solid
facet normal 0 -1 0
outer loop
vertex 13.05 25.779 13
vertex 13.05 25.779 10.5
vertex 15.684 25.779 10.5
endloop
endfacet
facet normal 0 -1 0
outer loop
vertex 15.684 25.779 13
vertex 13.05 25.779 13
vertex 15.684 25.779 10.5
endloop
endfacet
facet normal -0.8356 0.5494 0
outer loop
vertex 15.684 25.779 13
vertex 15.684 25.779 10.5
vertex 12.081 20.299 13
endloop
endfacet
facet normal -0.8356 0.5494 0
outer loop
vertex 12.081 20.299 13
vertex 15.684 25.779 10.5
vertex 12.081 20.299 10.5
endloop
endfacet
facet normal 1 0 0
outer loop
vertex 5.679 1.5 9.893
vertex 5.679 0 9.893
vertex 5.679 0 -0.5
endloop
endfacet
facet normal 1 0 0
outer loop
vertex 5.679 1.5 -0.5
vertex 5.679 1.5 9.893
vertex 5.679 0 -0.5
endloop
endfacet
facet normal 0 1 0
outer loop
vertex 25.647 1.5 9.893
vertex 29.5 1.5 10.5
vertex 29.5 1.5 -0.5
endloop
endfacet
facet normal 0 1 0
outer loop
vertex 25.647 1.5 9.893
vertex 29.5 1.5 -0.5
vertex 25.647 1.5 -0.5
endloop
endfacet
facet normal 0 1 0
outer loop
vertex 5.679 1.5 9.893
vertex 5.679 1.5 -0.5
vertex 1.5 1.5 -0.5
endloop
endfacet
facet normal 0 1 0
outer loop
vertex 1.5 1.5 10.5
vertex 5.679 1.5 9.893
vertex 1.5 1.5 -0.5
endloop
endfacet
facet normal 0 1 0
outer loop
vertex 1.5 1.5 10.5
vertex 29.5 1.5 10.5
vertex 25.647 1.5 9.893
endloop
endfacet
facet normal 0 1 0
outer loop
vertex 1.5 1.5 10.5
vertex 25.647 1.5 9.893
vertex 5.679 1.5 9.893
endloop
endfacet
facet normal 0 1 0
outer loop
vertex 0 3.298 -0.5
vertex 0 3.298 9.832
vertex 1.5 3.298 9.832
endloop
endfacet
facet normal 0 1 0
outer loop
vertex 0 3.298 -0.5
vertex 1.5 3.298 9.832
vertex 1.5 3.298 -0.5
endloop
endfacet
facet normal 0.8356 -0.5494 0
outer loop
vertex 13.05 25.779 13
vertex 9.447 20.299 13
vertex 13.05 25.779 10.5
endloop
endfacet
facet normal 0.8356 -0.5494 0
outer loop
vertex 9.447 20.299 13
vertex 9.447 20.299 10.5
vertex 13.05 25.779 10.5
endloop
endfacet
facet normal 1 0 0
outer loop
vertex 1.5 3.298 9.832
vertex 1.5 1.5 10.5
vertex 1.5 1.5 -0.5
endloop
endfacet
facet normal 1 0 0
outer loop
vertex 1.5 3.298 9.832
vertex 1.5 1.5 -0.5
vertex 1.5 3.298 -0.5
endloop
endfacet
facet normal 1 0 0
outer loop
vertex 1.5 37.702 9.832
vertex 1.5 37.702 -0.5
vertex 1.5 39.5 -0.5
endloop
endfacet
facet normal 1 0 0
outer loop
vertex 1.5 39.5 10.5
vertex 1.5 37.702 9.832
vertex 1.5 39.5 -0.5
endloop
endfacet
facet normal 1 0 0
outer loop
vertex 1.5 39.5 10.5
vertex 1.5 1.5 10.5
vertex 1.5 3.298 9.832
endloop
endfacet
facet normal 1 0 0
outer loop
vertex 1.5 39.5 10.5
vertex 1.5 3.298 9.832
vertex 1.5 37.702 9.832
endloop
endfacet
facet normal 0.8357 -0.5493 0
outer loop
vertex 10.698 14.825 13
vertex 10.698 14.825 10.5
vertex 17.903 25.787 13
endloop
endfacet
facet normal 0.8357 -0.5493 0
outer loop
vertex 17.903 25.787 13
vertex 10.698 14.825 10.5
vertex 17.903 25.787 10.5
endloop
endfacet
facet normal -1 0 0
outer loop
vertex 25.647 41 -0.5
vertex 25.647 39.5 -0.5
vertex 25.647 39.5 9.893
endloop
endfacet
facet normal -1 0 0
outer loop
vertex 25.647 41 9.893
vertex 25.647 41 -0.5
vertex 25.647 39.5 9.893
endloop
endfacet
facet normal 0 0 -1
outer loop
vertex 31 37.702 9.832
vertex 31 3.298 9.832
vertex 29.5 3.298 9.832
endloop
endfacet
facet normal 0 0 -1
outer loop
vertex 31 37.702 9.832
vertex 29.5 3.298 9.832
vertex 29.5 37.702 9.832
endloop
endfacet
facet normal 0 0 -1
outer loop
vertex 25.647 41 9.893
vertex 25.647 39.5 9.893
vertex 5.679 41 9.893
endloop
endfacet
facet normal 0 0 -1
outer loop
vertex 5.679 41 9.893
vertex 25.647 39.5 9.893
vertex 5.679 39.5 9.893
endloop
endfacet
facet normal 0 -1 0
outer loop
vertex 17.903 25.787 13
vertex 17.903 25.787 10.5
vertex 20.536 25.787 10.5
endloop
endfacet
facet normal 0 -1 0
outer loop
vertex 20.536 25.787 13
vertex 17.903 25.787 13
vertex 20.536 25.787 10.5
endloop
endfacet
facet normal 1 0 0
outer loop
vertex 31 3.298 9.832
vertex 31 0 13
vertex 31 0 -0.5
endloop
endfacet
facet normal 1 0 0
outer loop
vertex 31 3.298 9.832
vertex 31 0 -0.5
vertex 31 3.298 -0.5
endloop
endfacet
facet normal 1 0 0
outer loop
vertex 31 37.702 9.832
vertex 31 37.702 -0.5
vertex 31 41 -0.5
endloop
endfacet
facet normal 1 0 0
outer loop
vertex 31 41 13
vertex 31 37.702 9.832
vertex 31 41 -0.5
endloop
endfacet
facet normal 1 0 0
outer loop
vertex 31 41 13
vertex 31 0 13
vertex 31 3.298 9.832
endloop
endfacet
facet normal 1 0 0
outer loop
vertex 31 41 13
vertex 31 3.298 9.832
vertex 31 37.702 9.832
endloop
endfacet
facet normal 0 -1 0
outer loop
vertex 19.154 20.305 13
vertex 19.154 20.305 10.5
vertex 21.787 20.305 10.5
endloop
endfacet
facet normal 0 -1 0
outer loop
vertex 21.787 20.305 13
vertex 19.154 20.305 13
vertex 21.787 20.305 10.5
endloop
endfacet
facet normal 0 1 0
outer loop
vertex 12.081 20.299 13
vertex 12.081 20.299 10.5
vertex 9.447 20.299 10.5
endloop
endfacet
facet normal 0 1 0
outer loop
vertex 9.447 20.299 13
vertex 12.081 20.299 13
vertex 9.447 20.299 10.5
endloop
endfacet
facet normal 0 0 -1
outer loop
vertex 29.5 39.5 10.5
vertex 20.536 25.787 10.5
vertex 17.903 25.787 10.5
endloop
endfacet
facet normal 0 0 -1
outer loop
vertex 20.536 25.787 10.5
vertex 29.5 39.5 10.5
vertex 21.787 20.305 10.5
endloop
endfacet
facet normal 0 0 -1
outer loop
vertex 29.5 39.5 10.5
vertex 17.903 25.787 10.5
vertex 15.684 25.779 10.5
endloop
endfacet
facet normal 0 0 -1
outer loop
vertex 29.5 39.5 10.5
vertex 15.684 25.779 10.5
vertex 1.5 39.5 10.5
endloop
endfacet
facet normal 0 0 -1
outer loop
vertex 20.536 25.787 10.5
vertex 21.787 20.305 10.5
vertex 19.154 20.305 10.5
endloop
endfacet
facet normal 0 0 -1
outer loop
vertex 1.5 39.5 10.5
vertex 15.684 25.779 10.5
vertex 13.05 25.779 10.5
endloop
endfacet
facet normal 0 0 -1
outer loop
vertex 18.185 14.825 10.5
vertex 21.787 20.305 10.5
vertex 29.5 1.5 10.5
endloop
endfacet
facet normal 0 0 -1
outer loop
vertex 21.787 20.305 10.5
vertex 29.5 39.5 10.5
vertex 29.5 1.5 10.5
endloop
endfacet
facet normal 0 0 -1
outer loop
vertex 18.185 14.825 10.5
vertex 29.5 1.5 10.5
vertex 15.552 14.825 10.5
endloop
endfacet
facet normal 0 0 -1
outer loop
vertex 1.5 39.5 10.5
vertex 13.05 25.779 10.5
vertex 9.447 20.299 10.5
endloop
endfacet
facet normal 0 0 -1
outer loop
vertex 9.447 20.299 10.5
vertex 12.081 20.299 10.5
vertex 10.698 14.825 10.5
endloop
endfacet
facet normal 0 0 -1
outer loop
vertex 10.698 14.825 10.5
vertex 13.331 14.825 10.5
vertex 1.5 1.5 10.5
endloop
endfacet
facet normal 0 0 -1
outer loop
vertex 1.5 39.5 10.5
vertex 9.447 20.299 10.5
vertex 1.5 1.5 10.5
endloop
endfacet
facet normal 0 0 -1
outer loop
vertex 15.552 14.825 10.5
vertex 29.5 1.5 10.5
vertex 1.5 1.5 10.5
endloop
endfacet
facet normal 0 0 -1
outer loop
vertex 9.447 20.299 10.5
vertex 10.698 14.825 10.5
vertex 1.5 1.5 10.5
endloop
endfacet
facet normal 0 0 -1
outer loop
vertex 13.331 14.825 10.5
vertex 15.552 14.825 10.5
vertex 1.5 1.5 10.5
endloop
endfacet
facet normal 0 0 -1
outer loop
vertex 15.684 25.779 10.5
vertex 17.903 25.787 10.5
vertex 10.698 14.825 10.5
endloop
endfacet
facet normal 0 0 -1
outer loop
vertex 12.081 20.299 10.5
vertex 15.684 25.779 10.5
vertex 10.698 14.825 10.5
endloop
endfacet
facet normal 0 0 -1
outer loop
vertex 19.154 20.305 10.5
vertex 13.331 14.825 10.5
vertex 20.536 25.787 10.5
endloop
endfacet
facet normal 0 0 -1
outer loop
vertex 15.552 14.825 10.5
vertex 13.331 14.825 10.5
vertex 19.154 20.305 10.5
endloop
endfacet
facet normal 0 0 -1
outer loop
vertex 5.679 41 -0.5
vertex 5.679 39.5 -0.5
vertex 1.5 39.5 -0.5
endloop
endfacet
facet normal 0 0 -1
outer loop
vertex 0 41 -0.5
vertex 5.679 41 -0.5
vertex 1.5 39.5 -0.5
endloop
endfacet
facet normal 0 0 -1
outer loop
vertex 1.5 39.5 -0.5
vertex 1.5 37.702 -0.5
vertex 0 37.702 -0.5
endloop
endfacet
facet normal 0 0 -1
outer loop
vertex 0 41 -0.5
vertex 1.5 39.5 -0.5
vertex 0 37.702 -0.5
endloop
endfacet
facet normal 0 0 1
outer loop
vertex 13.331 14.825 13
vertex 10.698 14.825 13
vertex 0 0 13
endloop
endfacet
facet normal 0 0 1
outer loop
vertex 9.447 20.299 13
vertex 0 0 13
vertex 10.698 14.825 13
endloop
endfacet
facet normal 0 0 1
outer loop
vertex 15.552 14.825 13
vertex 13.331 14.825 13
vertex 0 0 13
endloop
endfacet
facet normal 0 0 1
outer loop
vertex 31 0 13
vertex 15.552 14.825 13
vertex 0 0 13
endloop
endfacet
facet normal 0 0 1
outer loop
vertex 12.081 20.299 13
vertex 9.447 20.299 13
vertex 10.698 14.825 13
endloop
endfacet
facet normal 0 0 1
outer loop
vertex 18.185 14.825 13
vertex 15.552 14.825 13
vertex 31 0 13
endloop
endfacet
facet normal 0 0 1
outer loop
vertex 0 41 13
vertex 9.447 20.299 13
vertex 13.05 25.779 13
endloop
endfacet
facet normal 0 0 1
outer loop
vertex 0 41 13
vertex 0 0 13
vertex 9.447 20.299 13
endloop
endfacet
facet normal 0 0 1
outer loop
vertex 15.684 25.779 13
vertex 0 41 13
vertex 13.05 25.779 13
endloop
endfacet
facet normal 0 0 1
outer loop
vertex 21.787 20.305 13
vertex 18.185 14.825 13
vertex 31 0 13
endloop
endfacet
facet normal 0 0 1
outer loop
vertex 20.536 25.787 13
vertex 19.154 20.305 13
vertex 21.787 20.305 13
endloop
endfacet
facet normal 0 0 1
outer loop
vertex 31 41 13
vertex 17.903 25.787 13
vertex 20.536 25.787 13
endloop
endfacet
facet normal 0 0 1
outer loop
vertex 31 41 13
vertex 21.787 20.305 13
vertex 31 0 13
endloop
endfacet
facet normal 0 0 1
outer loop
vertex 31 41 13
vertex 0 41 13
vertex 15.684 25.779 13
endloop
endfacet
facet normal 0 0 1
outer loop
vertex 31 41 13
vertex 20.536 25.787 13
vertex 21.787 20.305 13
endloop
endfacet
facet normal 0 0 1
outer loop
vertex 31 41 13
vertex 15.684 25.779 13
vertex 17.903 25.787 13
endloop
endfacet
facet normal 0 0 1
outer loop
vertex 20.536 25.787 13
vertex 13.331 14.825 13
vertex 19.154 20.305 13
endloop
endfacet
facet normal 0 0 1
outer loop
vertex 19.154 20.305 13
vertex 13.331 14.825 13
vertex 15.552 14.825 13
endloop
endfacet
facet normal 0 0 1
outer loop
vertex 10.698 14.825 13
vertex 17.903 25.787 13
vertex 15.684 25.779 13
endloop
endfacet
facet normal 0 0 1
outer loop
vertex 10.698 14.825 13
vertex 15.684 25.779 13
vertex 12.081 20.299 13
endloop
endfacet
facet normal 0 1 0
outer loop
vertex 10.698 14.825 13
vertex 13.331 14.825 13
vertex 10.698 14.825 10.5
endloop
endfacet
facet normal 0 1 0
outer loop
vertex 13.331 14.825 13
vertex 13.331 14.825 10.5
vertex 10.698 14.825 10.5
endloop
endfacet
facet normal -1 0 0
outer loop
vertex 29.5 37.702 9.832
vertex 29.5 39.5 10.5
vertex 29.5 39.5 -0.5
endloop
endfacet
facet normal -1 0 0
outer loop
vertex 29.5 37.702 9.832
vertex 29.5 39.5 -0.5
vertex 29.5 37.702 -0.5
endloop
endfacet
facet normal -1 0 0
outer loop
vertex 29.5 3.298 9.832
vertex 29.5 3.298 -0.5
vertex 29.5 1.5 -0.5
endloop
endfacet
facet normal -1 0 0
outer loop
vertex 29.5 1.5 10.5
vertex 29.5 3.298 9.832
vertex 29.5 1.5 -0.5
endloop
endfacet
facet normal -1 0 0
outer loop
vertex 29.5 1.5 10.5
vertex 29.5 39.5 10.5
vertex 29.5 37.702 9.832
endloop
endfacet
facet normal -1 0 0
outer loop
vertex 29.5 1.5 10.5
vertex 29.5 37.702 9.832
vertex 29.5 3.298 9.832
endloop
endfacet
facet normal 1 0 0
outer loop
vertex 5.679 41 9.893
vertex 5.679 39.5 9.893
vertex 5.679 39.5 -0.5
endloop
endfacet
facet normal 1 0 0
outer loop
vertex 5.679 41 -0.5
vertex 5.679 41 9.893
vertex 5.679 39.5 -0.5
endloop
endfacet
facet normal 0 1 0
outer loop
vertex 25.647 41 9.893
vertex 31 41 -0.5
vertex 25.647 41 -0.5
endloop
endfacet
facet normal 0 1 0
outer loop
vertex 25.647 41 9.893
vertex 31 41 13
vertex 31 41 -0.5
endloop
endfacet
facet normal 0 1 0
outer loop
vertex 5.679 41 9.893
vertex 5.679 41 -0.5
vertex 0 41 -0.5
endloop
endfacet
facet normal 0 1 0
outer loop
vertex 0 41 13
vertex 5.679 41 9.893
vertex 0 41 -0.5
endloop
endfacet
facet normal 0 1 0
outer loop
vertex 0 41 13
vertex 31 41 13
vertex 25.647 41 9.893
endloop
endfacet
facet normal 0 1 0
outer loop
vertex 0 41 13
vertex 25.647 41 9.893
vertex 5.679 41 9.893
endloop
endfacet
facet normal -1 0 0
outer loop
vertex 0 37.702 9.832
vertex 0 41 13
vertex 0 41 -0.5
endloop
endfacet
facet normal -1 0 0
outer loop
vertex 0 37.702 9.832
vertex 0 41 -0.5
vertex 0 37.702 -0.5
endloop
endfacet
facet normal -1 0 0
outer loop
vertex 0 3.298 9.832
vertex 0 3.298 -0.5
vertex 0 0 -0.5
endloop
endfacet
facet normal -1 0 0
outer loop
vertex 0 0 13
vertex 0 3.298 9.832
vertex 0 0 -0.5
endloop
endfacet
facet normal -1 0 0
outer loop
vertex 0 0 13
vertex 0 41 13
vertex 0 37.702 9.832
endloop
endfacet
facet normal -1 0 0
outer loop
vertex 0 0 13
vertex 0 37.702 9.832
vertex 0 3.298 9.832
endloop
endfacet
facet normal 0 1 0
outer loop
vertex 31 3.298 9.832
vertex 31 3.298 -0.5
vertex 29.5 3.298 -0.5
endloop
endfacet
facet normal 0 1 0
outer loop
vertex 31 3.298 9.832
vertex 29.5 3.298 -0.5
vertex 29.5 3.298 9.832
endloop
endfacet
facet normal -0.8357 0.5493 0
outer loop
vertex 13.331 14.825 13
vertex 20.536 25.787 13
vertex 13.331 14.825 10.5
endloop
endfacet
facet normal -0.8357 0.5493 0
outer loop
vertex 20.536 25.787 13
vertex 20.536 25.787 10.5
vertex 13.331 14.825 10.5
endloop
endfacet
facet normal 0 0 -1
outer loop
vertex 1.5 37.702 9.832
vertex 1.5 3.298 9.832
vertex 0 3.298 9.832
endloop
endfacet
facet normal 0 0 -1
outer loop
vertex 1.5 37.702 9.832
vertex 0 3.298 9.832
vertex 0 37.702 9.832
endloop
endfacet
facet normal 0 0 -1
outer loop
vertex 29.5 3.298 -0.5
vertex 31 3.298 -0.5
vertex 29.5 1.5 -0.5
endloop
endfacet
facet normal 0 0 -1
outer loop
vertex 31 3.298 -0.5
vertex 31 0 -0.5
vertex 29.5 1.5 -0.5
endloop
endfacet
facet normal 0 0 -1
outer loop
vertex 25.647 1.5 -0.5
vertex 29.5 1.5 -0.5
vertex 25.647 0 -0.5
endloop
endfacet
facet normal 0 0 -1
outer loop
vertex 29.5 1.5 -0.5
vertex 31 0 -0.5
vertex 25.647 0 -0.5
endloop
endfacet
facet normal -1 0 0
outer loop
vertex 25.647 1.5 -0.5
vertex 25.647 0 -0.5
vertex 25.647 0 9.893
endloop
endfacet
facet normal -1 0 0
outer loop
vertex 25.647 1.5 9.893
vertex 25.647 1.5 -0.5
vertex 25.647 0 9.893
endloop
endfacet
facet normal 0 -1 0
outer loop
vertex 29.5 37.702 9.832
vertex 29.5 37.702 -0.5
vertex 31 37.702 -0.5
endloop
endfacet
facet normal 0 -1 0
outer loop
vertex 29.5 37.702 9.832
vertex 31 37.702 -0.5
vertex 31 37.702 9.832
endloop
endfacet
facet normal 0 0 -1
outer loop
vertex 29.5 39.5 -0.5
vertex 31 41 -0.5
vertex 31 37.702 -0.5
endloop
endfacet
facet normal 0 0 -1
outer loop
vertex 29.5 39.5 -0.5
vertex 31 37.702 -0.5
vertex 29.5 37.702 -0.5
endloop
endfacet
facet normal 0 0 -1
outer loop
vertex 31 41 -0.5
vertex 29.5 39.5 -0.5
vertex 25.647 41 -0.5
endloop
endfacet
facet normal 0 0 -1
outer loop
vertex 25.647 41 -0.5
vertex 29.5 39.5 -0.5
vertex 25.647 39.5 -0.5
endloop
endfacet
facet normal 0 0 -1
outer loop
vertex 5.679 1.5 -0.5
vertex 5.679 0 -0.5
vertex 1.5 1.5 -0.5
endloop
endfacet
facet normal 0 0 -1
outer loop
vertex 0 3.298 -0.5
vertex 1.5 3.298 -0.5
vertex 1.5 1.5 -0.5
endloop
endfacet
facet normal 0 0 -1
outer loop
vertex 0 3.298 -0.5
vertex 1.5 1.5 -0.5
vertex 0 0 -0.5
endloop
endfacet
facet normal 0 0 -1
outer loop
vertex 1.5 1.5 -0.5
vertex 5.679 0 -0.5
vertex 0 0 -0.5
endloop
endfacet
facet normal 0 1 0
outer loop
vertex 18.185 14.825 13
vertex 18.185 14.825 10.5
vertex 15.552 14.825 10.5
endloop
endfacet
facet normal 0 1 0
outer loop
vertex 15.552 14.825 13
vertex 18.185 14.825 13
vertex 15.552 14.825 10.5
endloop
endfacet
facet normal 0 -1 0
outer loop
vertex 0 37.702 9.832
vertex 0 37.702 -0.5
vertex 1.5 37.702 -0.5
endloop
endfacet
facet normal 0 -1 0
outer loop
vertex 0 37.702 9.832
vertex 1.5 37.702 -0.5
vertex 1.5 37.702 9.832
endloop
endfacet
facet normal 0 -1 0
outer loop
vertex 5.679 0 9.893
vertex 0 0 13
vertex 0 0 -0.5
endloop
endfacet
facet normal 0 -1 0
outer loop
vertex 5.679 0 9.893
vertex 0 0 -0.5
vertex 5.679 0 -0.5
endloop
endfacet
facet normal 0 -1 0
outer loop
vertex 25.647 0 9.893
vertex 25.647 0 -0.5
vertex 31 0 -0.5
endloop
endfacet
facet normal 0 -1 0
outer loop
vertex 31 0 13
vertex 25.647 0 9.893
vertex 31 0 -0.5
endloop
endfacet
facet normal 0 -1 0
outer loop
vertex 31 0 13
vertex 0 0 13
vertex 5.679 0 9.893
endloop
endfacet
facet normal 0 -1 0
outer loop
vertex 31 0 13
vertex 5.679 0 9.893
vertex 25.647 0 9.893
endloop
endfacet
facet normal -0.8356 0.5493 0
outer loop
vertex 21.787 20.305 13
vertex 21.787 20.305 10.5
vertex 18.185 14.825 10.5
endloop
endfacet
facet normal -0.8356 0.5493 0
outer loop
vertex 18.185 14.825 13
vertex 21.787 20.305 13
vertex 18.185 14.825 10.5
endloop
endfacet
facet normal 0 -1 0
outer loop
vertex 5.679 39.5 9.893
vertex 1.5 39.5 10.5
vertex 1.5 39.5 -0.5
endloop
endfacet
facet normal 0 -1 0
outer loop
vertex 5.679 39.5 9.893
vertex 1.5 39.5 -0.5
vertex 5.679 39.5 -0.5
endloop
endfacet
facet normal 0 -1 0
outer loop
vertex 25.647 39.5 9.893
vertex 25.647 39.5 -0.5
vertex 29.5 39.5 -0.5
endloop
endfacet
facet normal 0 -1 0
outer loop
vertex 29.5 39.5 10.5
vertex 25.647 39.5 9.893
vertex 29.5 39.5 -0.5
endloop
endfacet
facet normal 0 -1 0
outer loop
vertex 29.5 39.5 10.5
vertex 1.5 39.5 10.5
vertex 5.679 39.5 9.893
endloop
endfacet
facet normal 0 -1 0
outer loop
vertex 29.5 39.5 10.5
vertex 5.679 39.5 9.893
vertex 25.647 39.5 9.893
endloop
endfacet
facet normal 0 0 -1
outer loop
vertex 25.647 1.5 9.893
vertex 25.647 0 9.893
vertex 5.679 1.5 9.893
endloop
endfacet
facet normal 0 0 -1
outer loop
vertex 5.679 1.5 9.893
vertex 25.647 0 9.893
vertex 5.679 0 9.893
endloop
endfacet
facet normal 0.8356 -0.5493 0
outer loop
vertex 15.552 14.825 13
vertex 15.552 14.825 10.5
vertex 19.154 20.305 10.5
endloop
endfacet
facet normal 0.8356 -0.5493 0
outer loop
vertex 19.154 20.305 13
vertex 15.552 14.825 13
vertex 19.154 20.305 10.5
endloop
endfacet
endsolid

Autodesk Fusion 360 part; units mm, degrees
sketch "Sketch1" plane through (0, 0, 0) normal (0, 0, 1) x (1, 0, 0)
  line L0 (0, 0) -> (31, 0)
  line L1 (31, 0) -> (31, 41)
  line L2 (31, 41) -> (0, 41)
  line L3 (0, 41) -> (0, 0)
  line L4 (1.5, 39.5) -> (29.5, 39.5)
  line L5 (29.5, 39.5) -> (29.5, 1.5)
  line L6 (29.5, 1.5) -> (1.5, 1.5)
  line L7 (1.5, 1.5) -> (1.5, 39.5)
  line L8 (1.5, 39.5) -> (29.5, 1.5) construction
  line L9 (29.5, 39.5) -> (1.5, 1.5) construction
  circle A0 centre (15.5, 28.7333) radius 7.5
  point P0 (15.5, 20.5)
  dimension "d1" = 31
  dimension "d2" = 41
  dimension "d3" = 28
  dimension "d4" = 38
  dimension "d5" = 15
extrude "Extrude1" add sketch "Sketch1" along normal blind 2 contours L0 L1 L2 L3 | L4 L5 L6 L7 makes body 1
extrude "Extrude2" add sketch "Sketch1" along normal blind 4 contours L4 L5 L6 L7 bodies 1
sketch "Sketch1 (2)" plane through (0, 0, 2) normal (0, 0, 1) x (-1, 0, 0) in component "Top"
  line L0 (-1.5, -1.5) -> (-1.5, -39.5)
  line L1 (-1.5, -39.5) -> (-29.5, -39.5)
  line L2 (-29.5, -39.5) -> (-29.5, -1.5)
  line L3 (-29.5, -1.5) -> (-1.5, -1.5)
  line L4 (0, -41) -> (0, 0)
  line L5 (0, 0) -> (-31, 0)
  line L6 (-31, 0) -> (-31, -41)
  line L7 (-31, -41) -> (0, -41)
  line L8 (0, -41) -> (-31, -41)
  line L9 (-31, -41) -> (-31, 0)
  line L10 (-31, 0) -> (0, 0)
  line L11 (0, 0) -> (0, -41)
extrude "Extrude1'" add sketch "Sketch1 (2)" along normal blind 10 separate body contours L0 L1 L2 L3 | L4 L5 L6 L7 L8 L9 L10 L11 makes body 2 in component "Top"
shell "Shell1" thickness 1.5 removed faces 1 at (10.3333, 27.3333, 2) on bodies 2 in component "Top"
ref_plane "WorkPlane1" through (15.5, 20.5, 12) normal (0, 0, 1) x (1, 0, 0)
sketch "Sketch2" plane through (15.5, 20.5, 12) normal (0, 0, 1) x (1, 0, 0) in component "Top"
  line L0 (0.1136, 9.8824) -> (-8.6176, 4.8413)
  line L1 (-8.6176, 4.8413) -> (-8.6176, -5.2393)
  line L2 (-8.6176, -5.2393) -> (0.1136, -10.2796)
  line L3 (0.1136, -10.2796) -> (8.8449, -5.2393)
  line L4 (8.8449, -5.2393) -> (8.8449, 4.8413)
  line L5 (8.8449, 4.8413) -> (0.1136, 9.8824)
  line L6 (-2.4502, 5.2787) -> (0.1835, 5.2787)
  line L7 (0.1835, 5.2787) -> (-3.4193, -0.2014)
  line L8 (-3.4193, -0.2014) -> (-6.053, -0.2014)
  line L9 (-6.053, -0.2014) -> (-2.4502, 5.2787)
  line L10 (-4.8021, -5.6751) -> (2.4028, 5.2866)
  line L11 (2.4028, 5.2866) -> (5.0365, 5.2866)
  line L12 (5.0365, 5.2866) -> (-2.1692, -5.6751)
  line L13 (-2.1692, -5.6751) -> (-4.8021, -5.6751)
  line L14 (2.6854, -5.6751) -> (0.0517, -5.6751)
  line L15 (0.0517, -5.6751) -> (3.6538, -0.195)
  line L16 (3.6538, -0.195) -> (6.2874, -0.195)
  line L17 (6.2874, -0.195) -> (2.6854, -5.6751)
extrude "Extrude2'" cut sketch "Sketch2" against normal blind 0.5 bodies 2 in component "Top"
extrude "Extrude3" cut 3 faces at (19.7089, 18.4783, 12) (17.2567, 22.1327, 12) (13.6047, 23.952, 12) along direction (0, 0, -1) blind 2 on bodies 2 bodies 2 in component "Top"
sketch "Sketch2 (1)" plane through (0, 41, 0) normal (0, 1, 0) x (-1, 0, 0) in component "Top"
  line L0 (-31, 2) -> (0, 2)
  line L1 (0, 2) -> (0, 12)
  line L2 (0, 12) -> (-31, 12)
  line L3 (-31, 12) -> (-31, 2)
  line L4 (-28.0584, 2) -> (-2.1668, 2)
  line L5 (-2.1668, 2) -> (-2.1668, 9.9165)
  line L6 (-2.1668, 9.9165) -> (-28.0584, 9.9165)
  line L7 (-28.0584, 9.9165) -> (-28.0584, 2)
  point P0 (-15.5, 7)
sketch "Sketch3" plane through (31, 0, 0) normal (1, 0, 0) x (0, 1, 0) in component "Top"
  line L0 (0, 2) -> (41, 2)
  line L1 (41, 2) -> (41, 12)
  line L2 (41, 12) -> (0, 12)
  line L3 (0, 12) -> (0, 2)
  line L4 (3.2975, 9.8315) -> (37.7025, 9.8315)
  line L5 (37.7025, 9.8315) -> (37.7025, 4.1685)
  line L6 (37.7025, 4.1685) -> (3.2975, 4.1685)
  line L7 (3.2975, 4.1685) -> (3.2975, 9.8315)
  line L8 (3.2975, 9.8315) -> (37.7025, 4.1685) construction
  line L9 (37.7025, 9.8315) -> (3.2975, 4.1685) construction
  point P0 (20.5, 7)
extrude "Extrude5" cut sketch "Sketch3" against normal blind 35 contours L4 L5 L6 L7 bodies 2 in component "Top"
extrude "Extrude6" add 1 faces at (15.5379, 37.4608, 12) along direction (0, 0, 1) blind 1 on bodies 2 bodies 2 in component "Top"
extrude "Extrude7" add 1 faces at (9.7931, 23.8062, 11.5) along direction (0, 0, 1) blind 1.5 on bodies 2 bodies 2 in component "Top"
extrude "Extrude8" cut 1 faces at (15.5612, 35.9262, 13) along direction (0, 0, 1) blind 1 on bodies 2 bodies 2 in component "Top"
extrude "Extrude9" add sketch "Sketch1 (2)" against normal blind 2.5 bodies 2 in component "Top"
sketch "Sketch4" plane through (0, 0, 0) normal (-1, 0, 0) x (0, -1, 0) in component "Top"
  line L0 (-37.7025, 4.1685) -> (-37.7025, 9.8315)
  line L1 (-37.7025, 9.8315) -> (-3.2975, 9.8315)
  line L2 (-3.2975, 9.8315) -> (-3.2975, 4.1685)
  line L3 (-3.2975, 4.1685) -> (-37.7025, 4.1685)
  line L4 (0, -0.5) -> (0, 13)
  line L5 (0, 13) -> (-41, 13)
  line L6 (-41, 13) -> (-41, -0.5)
  line L7 (-41, -0.5) -> (0, -0.5)
  line L8 (-37.7025, 9.8315) -> (-3.2975, 9.8315)
  line L9 (-3.2975, 9.8315) -> (-3.2975, -1.832)
  line L10 (-3.2975, -1.832) -> (-37.7025, -1.832)
  line L11 (-37.7025, -1.832) -> (-37.7025, 9.8315)
extrude "Extrude10" cut sketch "Sketch4" against normal blind 45.044 contours L0 L1 L2 L3 L8 L9 L11 | L3 L7 L9 L11 | L7 L9 L10 L11 bodies 2 in component "Top"
sketch "Sketch5" plane through (0, 0, 0) normal (0, -1, 0) x (1, 0, 0) in component "Top"
  line L0 (31, -0.5) -> (31, 13)
  line L1 (31, 13) -> (0, 13)
  line L2 (0, 13) -> (0, -0.5)
  line L3 (0, -0.5) -> (31, -0.5)
  line L4 (5.6791, -0.5) -> (25.6474, -0.5)
  line L5 (25.6474, -0.5) -> (25.6474, 9.8926)
  line L6 (25.6474, 9.8926) -> (5.6791, 9.8926)
  line L7 (5.6791, 9.8926) -> (5.6791, -0.5)
extrude "Extrude11" cut sketch "Sketch5" against normal blind 159.301 contours L3 L4 L5 L6 L7 bodies 2 in component "Top"
component "Top" placed x (1, 0, 0) y (0, 1, 0) z (0, 0, 1) at (0, 0, 0)
hidden bodies 1
